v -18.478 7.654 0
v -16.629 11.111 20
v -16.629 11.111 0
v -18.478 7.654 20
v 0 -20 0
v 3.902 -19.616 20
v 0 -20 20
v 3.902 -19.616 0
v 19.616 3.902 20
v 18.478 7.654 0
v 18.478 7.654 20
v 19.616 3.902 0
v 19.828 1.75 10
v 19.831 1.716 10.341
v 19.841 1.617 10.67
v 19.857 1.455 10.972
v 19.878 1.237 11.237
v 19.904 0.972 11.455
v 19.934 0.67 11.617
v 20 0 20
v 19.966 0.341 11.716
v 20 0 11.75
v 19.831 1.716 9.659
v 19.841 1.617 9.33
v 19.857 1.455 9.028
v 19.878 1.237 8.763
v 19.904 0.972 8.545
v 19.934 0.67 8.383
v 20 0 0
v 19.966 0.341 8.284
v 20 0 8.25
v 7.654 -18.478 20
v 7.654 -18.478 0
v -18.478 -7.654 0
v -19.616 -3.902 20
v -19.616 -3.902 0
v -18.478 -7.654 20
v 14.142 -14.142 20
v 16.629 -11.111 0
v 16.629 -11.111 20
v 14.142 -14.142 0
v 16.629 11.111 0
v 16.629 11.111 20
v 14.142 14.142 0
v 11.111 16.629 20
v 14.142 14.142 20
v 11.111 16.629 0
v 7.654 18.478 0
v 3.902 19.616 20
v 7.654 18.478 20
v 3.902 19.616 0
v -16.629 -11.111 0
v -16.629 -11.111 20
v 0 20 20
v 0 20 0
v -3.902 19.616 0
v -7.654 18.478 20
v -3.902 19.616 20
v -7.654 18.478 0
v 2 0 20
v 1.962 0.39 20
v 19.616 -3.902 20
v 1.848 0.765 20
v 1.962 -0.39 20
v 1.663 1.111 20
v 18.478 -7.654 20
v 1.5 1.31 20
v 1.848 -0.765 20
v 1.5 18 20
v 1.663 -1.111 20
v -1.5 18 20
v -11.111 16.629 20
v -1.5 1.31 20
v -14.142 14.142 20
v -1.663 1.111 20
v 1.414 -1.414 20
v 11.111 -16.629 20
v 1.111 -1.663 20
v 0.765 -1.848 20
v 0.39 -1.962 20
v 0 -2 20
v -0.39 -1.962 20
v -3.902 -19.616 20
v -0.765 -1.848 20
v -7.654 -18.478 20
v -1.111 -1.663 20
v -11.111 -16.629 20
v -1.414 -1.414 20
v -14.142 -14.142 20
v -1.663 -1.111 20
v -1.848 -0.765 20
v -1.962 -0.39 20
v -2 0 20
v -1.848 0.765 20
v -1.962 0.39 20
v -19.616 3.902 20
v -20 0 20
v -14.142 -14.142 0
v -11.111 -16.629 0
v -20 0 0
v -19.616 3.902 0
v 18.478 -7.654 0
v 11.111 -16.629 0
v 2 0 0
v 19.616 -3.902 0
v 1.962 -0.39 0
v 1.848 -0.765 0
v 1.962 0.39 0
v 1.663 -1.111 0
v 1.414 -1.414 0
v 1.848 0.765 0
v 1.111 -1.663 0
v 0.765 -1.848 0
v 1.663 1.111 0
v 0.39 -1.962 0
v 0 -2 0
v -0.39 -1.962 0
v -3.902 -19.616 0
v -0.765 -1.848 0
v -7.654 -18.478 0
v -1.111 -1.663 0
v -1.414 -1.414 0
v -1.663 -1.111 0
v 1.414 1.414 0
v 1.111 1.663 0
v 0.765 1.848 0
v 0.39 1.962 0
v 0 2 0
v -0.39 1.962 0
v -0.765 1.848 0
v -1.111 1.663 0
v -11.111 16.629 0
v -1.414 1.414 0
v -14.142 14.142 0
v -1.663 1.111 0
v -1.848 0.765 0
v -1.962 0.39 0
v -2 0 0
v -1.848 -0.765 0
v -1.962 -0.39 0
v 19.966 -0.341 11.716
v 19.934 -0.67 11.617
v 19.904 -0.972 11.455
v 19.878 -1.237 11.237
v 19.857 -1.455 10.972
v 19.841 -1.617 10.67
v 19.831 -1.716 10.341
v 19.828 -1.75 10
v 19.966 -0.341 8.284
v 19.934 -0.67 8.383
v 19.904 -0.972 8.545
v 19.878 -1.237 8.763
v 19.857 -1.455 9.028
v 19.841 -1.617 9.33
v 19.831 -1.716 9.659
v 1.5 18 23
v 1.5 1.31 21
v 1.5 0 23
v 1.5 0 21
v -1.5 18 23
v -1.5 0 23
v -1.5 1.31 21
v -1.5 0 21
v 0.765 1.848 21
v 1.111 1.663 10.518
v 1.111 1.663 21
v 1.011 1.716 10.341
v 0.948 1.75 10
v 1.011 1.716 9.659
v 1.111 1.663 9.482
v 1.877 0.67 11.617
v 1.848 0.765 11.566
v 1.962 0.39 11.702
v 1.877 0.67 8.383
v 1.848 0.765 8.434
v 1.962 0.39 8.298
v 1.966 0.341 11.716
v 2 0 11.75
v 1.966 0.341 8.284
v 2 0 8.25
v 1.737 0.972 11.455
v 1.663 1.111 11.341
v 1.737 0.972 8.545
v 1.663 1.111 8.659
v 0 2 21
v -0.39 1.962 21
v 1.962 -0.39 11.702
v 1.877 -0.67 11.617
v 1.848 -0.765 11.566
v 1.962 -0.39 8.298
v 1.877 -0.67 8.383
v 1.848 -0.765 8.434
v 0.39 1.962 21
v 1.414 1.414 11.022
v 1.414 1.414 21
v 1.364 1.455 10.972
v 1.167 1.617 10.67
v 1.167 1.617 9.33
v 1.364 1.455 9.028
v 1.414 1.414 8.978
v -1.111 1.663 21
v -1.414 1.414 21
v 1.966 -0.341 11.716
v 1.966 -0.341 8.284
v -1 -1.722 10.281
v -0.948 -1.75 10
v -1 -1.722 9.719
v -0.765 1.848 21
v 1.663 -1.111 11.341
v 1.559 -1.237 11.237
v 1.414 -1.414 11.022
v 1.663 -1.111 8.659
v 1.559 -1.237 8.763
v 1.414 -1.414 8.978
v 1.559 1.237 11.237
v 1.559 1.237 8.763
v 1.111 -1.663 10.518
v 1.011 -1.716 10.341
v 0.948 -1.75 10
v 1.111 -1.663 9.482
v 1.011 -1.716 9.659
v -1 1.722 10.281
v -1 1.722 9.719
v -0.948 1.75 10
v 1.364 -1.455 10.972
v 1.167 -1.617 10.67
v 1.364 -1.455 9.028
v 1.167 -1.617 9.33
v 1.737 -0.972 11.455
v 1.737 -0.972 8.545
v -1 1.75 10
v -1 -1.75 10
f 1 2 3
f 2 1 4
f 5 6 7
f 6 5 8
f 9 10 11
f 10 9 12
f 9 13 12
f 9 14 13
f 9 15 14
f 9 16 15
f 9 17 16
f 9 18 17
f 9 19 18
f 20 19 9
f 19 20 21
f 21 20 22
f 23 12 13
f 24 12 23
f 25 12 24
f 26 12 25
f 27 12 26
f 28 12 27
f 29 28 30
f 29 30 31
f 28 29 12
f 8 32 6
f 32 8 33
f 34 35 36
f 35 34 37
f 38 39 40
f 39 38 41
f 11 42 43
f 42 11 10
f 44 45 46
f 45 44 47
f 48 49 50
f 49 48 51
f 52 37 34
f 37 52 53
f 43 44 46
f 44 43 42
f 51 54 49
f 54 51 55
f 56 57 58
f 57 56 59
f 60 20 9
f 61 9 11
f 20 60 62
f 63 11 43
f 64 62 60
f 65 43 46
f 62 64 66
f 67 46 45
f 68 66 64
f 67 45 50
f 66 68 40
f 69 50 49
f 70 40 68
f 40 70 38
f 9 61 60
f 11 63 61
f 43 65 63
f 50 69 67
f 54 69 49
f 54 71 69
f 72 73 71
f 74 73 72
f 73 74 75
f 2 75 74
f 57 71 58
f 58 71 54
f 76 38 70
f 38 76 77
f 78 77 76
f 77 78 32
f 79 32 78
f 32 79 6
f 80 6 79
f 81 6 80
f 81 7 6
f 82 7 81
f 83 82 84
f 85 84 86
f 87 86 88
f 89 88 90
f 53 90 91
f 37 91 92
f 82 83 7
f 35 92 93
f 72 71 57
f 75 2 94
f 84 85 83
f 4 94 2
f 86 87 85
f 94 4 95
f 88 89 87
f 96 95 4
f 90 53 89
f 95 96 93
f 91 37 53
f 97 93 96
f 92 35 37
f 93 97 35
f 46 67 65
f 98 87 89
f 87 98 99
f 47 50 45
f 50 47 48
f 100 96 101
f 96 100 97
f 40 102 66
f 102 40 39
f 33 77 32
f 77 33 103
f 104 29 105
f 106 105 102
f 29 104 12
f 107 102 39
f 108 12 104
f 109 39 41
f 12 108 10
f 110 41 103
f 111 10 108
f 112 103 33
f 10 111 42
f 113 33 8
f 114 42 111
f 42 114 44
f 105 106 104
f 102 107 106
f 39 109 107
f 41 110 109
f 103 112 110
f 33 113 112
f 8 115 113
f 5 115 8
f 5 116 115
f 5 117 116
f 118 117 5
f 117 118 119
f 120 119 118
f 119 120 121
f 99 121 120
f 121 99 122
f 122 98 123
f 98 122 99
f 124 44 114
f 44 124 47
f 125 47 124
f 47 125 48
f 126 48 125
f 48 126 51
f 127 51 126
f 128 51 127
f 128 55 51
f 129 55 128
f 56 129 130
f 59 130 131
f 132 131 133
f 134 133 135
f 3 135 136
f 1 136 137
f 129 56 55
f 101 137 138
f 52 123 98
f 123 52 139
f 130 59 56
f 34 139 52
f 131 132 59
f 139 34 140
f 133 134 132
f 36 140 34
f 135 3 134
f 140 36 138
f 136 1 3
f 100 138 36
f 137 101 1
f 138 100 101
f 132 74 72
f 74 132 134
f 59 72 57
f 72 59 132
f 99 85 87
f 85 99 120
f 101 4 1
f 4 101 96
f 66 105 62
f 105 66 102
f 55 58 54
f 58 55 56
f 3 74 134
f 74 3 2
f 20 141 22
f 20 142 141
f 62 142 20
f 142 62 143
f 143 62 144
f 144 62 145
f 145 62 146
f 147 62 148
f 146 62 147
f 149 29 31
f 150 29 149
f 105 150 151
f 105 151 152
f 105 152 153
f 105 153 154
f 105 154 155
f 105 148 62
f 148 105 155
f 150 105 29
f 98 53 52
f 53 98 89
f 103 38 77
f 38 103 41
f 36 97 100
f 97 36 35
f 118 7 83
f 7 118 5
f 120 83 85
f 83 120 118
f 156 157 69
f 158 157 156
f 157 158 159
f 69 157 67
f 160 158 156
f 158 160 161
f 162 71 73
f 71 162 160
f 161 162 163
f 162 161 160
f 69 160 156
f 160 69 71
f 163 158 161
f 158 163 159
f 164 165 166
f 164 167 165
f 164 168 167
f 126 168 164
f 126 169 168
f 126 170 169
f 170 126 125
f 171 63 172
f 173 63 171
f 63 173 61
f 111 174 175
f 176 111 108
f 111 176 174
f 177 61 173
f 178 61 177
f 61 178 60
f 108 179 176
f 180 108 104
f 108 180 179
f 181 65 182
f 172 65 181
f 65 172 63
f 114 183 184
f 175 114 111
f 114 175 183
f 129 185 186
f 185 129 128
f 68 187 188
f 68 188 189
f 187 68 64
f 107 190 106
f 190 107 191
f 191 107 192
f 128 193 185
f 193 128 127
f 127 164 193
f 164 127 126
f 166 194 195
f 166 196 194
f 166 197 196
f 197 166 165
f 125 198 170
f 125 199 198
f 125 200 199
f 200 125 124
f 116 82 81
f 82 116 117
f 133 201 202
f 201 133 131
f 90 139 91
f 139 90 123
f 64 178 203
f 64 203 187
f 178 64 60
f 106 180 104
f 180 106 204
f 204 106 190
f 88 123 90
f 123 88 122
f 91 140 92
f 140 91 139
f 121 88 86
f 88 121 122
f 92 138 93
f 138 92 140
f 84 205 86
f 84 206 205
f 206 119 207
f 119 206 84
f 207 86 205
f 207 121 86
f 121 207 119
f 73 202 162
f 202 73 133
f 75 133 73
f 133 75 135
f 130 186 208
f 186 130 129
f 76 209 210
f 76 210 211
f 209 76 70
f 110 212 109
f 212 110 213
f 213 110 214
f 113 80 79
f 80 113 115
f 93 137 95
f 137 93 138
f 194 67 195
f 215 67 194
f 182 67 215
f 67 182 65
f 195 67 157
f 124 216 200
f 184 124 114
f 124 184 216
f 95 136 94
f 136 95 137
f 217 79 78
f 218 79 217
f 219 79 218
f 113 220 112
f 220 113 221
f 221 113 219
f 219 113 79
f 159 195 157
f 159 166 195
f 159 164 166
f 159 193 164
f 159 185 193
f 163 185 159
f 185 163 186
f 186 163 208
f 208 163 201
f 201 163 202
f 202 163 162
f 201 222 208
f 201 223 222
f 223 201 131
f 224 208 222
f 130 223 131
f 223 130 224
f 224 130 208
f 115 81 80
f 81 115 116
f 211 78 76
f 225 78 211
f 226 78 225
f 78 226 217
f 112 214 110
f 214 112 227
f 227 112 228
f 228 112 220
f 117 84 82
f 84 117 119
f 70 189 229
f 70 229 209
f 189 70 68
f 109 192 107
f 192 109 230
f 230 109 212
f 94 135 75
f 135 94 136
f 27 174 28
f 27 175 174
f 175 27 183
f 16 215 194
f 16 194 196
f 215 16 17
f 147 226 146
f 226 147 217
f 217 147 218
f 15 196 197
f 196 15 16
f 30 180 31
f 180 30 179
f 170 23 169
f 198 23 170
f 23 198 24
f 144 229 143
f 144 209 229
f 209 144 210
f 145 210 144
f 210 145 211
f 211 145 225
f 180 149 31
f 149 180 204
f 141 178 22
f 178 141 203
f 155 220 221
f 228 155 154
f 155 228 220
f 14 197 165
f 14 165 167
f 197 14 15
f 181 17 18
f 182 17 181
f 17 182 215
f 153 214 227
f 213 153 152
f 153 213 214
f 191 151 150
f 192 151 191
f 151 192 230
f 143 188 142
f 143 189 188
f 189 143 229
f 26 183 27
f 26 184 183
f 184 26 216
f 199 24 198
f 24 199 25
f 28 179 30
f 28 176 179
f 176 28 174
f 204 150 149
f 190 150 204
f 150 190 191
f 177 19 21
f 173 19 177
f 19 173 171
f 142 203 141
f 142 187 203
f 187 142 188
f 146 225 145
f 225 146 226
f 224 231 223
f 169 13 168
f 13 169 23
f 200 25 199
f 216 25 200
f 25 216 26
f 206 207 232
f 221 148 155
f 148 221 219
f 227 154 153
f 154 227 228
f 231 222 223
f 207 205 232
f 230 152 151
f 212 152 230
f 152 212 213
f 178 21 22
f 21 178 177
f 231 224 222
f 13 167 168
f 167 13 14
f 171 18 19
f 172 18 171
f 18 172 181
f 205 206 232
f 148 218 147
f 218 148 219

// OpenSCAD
$fn = 32;

// ----------------------------------------------------------------------
// Control knob: pointer knob
// ----------------------------------------------------------------------

// --- parameters (mm) ---
rib_w = 3;                // pointer rib width
rib_h = 4;                // pointer rib height
knob_d = 40;              // knob body diameter
knob_h = 20;              // knob body height
bore_d = 4;               // shaft bore diameter
set_d = 3.5;              // set screw bore diameter
fit_tol = 0.05;           // tolerance for press fits, mm
free_tol = 0.2;           // tolerance for clearance fits, mm

rib_poke = rib_h - 1;  // rib height above the top
total_h = knob_h + rib_h - 1;  // overall height

difference() {
  union() {
    cylinder(h = knob_h, d = knob_d);
    translate([-rib_w / 2, 0, knob_h - 1])
      cube([rib_w, knob_d / 2 - 2, rib_h]);
  }
  translate([0, 0, -1]) cylinder(h = knob_h + 2, d = bore_d);
  translate([-1, 0, knob_h / 2]) rotate([0, 90, 0])
    cylinder(h = knob_d / 2 + bore_d / 2 + 2, d = set_d);}
